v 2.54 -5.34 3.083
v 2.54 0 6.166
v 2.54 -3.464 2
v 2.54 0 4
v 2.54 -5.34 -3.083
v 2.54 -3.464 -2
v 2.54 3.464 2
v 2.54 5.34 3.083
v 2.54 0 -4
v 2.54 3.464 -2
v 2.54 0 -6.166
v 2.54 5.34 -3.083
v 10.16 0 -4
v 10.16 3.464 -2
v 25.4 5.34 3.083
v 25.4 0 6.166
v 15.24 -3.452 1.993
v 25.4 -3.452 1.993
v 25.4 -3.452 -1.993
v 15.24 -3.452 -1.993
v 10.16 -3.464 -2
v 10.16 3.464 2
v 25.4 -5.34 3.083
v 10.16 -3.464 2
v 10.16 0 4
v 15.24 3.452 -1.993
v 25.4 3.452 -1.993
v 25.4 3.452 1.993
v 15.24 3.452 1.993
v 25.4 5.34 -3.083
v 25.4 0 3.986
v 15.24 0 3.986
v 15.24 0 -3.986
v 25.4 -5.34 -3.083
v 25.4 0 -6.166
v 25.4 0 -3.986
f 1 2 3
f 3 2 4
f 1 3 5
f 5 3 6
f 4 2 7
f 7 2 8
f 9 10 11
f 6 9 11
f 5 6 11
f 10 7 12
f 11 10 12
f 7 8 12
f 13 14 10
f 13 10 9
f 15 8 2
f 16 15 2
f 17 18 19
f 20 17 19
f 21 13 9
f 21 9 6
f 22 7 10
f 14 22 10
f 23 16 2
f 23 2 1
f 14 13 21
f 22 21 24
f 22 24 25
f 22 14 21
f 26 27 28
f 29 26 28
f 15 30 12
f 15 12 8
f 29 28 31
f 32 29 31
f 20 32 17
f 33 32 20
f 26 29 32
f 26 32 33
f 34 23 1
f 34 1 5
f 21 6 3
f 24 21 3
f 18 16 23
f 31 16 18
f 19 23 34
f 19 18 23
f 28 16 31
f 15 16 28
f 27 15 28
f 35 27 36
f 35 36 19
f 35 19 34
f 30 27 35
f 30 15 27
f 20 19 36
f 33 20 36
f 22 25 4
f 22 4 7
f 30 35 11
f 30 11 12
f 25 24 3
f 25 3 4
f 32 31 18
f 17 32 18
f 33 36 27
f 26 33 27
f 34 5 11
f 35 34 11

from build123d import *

# Parameters (mm, degrees)
BOSS_EXTRUDE5_DEPTH = 25.4
BOSS_EXTRUDE6_DEPTH = 22.86
CUT_EXTRUDE2_DEPTH  = 10.16
CUT_EXTRUDE4_DEPTH  = 10.16


with BuildPart() as part:
    # Sketch5 → Boss-Extrude5 (new body)
    with BuildSketch(Plane(origin=(0, 0, 0), x_dir=(0, 0, -1), z_dir=(1, 0, 0))):
        Polygon((4, 0), (2, 3.464101615), (-2, 3.464101615), (-4, 0), (-2, -3.464101615), (2, -3.464101615), align=None)
    extrude(amount=BOSS_EXTRUDE5_DEPTH)

    # Sketch7 → Boss-Extrude6 (add)
    with BuildSketch(Plane(origin=(25.4, 0, 0), x_dir=(0, 0, -1), z_dir=(1, 0, 0))):
        Polygon((6.165569463, 0), (3.082784731, 5.339539784), (-3.082784731, 5.339539784), (-6.165569463, 0), (-3.082784731, -5.339539784), (3.082784731, -5.339539784), align=None)
    extrude(amount=-BOSS_EXTRUDE6_DEPTH)

    # Sketch8 → Cut-Extrude2 (cut)
    with BuildSketch(Plane.ZY):
        Polygon((4, 0), (2, 3.464101615), (-2, 3.464101615), (-4, 0), (-2, -3.464101615), (2, -3.464101615), align=None)
    extrude(amount=-CUT_EXTRUDE2_DEPTH, mode=Mode.SUBTRACT)

    # Sketch12 → Cut-Extrude4 (cut)
    with BuildSketch(Plane(origin=(25.4, 0, 0), x_dir=(0, 0, -1), z_dir=(1, 0, 0))):
        Polygon((1.992845787, 3.451710154), (-1.992845787, 3.451710154), (-3.985691573, 0), (-1.992845787, -3.451710154), (1.992845787, -3.451710154), (3.985691573, 0), align=None)
    extrude(amount=-CUT_EXTRUDE4_DEPTH, mode=Mode.SUBTRACT)


solid = part.part
